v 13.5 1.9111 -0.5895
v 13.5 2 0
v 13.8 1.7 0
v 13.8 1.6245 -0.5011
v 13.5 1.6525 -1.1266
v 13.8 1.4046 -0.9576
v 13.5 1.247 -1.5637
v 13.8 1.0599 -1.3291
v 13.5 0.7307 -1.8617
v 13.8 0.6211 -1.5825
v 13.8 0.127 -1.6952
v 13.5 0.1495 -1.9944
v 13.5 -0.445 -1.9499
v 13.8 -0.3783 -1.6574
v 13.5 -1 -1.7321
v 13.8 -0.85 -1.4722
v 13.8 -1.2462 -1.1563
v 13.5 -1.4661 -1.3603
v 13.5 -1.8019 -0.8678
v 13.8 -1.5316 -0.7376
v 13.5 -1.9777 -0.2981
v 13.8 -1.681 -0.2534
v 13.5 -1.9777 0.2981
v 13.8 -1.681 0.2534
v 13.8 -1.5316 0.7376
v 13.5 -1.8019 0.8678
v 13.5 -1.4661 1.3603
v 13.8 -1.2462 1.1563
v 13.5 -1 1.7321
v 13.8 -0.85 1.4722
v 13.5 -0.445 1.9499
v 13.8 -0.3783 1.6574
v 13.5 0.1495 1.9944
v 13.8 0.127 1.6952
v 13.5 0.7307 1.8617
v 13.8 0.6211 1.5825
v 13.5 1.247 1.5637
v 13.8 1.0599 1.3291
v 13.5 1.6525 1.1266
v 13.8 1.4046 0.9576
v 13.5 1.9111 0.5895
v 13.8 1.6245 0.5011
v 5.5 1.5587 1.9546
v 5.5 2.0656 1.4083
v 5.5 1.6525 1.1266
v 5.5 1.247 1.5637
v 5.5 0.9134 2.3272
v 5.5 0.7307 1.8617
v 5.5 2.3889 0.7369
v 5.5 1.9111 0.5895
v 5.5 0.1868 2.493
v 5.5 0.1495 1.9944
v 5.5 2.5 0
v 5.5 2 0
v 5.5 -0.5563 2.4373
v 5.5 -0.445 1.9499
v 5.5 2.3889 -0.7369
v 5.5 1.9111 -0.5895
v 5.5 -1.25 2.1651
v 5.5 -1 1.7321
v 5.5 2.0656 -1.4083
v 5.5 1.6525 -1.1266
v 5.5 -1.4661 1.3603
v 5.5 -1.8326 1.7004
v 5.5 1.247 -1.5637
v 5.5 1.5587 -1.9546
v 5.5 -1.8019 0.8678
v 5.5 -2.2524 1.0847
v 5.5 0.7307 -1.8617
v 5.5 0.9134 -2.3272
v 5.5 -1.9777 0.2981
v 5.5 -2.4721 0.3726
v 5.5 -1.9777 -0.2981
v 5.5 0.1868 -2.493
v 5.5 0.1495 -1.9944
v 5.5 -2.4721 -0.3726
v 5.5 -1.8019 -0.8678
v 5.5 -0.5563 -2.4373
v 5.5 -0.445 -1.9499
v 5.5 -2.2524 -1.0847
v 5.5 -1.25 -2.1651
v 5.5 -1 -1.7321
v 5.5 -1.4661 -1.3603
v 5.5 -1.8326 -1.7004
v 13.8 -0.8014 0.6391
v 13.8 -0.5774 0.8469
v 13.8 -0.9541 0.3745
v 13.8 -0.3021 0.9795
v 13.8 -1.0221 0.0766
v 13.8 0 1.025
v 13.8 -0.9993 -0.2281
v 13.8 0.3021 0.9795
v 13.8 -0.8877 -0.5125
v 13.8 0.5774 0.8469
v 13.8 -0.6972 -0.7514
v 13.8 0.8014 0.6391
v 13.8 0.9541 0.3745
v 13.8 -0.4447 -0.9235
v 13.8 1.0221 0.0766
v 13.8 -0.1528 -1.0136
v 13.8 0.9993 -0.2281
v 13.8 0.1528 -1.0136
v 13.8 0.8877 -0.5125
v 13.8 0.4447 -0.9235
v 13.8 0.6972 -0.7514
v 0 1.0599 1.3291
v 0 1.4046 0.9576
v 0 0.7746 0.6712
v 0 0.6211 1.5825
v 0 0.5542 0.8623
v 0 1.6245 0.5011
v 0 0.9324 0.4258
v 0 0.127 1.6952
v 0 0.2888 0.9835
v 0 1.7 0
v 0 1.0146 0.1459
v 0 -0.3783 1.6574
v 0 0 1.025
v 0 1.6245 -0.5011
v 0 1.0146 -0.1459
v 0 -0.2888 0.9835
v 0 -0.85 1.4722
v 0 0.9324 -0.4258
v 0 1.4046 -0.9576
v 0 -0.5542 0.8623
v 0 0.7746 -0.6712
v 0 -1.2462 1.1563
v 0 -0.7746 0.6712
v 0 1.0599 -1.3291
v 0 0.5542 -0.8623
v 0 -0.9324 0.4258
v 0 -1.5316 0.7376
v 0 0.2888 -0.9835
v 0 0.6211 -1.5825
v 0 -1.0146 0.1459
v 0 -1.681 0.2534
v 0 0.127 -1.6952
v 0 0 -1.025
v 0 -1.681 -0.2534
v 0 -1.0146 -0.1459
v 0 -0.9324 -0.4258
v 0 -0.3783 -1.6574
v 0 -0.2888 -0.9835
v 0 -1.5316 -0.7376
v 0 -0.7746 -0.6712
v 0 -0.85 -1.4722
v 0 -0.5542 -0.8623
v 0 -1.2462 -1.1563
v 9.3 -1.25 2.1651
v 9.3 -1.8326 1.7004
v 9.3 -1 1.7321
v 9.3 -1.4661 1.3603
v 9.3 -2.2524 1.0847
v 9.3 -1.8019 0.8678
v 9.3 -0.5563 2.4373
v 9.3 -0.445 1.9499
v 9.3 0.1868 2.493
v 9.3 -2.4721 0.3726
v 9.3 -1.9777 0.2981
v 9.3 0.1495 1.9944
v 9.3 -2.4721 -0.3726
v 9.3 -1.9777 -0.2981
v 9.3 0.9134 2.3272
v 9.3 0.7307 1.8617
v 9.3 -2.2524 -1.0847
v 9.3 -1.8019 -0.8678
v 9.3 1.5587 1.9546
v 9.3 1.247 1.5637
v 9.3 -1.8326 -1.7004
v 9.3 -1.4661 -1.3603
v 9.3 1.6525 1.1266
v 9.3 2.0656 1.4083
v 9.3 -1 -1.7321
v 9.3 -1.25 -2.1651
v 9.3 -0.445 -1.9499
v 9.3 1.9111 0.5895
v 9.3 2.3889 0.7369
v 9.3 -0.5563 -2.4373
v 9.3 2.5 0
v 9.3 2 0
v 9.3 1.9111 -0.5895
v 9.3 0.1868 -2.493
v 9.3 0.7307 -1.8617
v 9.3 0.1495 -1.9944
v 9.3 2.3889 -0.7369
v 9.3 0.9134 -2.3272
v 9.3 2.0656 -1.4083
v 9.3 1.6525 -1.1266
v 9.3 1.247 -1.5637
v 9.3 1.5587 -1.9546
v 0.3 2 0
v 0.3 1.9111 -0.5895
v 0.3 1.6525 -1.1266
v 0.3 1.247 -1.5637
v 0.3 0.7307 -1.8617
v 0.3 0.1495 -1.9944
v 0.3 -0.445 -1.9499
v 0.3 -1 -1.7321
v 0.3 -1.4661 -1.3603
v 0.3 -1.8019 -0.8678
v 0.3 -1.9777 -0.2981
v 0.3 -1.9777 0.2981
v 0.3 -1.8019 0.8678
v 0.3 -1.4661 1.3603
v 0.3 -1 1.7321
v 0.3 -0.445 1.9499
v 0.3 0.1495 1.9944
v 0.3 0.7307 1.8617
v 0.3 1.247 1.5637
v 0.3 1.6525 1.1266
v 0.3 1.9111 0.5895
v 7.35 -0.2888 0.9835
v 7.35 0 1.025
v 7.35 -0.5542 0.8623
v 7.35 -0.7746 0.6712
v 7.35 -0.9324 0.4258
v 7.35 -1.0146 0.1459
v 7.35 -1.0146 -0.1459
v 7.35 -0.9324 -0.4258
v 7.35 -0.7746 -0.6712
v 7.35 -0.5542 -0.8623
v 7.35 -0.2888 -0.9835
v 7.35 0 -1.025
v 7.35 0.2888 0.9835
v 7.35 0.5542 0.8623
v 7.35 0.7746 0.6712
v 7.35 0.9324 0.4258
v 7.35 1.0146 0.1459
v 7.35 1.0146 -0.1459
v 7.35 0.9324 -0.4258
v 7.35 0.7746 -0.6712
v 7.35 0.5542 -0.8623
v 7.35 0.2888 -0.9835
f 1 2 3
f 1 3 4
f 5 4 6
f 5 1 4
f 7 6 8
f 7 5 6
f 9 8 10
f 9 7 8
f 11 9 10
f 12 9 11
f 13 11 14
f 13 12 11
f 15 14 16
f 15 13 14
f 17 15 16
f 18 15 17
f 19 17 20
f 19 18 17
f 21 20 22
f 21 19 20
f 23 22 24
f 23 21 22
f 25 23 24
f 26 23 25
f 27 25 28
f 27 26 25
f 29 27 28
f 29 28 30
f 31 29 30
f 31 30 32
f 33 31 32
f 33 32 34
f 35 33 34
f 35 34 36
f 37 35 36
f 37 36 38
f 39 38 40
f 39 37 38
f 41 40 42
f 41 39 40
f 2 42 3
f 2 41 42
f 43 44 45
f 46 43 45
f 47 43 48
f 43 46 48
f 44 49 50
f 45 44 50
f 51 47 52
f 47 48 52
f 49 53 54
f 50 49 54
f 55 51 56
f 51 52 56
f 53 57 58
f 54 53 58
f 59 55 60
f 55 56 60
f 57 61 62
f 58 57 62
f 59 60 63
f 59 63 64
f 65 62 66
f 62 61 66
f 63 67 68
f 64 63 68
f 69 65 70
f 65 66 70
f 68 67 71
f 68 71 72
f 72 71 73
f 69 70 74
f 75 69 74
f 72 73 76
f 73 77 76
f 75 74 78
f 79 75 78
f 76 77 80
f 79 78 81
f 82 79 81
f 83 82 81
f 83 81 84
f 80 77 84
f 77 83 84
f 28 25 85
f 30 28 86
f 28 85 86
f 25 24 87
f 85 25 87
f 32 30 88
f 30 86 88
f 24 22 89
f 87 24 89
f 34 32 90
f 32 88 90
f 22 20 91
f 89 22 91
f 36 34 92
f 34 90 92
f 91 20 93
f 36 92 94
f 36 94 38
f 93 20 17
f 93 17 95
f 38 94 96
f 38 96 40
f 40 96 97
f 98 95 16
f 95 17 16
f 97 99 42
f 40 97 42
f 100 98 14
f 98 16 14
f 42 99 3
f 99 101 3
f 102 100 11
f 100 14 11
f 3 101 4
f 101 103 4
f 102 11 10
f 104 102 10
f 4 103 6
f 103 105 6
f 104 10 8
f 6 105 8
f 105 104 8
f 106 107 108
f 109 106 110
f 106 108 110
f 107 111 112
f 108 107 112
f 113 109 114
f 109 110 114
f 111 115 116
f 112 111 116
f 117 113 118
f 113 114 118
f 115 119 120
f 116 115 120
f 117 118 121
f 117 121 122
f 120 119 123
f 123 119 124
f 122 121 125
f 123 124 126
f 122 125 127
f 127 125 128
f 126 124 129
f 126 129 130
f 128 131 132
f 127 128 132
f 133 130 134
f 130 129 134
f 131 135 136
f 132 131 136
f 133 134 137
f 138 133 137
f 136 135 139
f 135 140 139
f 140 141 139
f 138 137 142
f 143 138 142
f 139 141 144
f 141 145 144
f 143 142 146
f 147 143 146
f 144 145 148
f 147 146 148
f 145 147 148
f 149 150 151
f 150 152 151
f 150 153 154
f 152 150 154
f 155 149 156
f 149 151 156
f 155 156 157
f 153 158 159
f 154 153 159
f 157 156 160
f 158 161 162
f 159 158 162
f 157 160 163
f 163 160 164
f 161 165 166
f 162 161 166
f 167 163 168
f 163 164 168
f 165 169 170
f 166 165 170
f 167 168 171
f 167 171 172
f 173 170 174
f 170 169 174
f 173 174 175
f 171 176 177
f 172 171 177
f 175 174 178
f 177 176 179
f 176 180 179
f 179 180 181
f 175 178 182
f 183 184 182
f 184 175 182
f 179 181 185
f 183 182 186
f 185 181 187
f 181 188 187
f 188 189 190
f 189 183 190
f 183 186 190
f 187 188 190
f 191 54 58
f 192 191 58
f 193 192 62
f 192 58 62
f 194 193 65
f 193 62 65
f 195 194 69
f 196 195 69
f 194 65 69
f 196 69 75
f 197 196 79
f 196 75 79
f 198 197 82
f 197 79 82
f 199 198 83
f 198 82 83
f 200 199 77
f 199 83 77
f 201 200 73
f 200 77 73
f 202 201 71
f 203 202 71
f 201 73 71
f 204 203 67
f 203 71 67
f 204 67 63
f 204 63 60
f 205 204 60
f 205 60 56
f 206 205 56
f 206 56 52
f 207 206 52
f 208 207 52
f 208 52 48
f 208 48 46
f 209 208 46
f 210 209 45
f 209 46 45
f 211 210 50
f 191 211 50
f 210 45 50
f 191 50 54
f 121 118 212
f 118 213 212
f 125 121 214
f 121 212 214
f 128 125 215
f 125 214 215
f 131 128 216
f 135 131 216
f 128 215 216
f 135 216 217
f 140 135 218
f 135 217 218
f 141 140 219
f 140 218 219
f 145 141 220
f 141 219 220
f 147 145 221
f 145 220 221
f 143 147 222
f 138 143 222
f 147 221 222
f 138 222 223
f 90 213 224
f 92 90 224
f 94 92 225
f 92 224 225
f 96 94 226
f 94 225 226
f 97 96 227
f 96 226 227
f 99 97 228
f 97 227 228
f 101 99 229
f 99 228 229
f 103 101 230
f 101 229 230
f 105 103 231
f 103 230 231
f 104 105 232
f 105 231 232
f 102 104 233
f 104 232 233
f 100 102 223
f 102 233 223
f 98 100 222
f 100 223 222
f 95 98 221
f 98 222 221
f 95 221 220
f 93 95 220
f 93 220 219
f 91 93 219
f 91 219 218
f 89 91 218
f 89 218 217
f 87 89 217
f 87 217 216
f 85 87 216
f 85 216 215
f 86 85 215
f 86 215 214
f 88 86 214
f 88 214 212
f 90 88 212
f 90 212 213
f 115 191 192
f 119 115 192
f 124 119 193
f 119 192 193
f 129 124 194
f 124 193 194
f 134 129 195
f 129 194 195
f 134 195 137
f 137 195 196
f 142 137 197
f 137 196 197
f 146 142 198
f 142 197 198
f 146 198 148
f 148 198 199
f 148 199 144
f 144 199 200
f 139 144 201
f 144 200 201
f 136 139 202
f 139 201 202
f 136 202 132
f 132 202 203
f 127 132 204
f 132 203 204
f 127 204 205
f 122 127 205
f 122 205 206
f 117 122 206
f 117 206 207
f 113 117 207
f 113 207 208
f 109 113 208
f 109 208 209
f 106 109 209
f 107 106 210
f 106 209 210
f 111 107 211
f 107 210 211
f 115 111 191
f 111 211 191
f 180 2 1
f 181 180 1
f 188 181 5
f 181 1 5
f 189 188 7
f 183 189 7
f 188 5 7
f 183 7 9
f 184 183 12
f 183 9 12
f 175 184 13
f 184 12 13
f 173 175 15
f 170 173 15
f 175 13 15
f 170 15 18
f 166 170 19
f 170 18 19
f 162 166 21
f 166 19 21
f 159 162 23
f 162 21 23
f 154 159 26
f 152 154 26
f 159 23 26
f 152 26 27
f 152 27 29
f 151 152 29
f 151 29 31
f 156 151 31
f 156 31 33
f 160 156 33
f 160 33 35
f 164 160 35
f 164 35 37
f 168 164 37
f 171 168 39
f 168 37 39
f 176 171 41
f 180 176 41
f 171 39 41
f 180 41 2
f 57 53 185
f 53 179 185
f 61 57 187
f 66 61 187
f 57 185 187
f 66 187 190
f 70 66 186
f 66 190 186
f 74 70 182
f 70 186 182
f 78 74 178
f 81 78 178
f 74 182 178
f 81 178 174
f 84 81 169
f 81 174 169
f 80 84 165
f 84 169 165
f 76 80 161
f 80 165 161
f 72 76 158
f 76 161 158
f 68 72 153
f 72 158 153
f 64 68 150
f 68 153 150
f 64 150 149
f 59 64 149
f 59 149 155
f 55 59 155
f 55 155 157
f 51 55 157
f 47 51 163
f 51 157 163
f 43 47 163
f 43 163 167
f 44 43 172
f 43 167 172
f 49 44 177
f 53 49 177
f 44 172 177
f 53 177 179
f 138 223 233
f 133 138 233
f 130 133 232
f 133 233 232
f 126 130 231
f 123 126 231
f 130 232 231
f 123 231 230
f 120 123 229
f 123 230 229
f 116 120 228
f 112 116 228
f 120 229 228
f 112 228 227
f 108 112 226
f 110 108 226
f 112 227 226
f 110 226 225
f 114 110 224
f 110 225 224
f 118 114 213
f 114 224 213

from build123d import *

# Parameters (mm, degrees)
TROU_TARAUD_M2_52_D     = 2.05
TROU_TARAUD_M2_52_DEPTH = 7.35
TROU_TARAUD_M2_52_TIP   = 0.615882135
TROU_TARAUD_M2_51_D     = 2.05
CHANFREIN1_SIZE         = 0.3


with BuildPart() as part:
    # Esquisse1 → Révolution1 (revolve)
    with BuildSketch(Plane.XY):
        Polygon((0, 0), (0, 2), (5.5, 2), (5.5, 2.5), (9.3, 2.5), (9.3, 2), (13.8, 2), (13.8, 0), align=None)
    revolve(axis=Axis((13.8, 0, 0), (-1, 0, 0)))

    # Trou taraudé M2.52
    with Locations(Plane.ZY):
        with Locations((0, 0)):
            Hole(TROU_TARAUD_M2_52_D / 2, depth=TROU_TARAUD_M2_52_DEPTH)
            with Locations((0, 0, -(TROU_TARAUD_M2_52_DEPTH + TROU_TARAUD_M2_52_TIP / 2))):  # 118° drill point
                Cone(0, TROU_TARAUD_M2_52_D / 2, TROU_TARAUD_M2_52_TIP, mode=Mode.SUBTRACT)

    # Trou taraudé M2.51 (through all)
    with Locations(Plane(origin=(13.8, 0, 0), x_dir=(0, 0, -1), z_dir=(1, 0, 0))):
        with Locations((0, 0)):
            Hole(TROU_TARAUD_M2_51_D / 2)

    # Chanfrein1
    chanfrein1_edges = [part.edges().sort_by_distance(p)[0] for p in [
        (0, -2, 0),
        (13.8, -2, 0),
    ]]
    chamfer(chanfrein1_edges, length=CHANFREIN1_SIZE)


solid = part.part
